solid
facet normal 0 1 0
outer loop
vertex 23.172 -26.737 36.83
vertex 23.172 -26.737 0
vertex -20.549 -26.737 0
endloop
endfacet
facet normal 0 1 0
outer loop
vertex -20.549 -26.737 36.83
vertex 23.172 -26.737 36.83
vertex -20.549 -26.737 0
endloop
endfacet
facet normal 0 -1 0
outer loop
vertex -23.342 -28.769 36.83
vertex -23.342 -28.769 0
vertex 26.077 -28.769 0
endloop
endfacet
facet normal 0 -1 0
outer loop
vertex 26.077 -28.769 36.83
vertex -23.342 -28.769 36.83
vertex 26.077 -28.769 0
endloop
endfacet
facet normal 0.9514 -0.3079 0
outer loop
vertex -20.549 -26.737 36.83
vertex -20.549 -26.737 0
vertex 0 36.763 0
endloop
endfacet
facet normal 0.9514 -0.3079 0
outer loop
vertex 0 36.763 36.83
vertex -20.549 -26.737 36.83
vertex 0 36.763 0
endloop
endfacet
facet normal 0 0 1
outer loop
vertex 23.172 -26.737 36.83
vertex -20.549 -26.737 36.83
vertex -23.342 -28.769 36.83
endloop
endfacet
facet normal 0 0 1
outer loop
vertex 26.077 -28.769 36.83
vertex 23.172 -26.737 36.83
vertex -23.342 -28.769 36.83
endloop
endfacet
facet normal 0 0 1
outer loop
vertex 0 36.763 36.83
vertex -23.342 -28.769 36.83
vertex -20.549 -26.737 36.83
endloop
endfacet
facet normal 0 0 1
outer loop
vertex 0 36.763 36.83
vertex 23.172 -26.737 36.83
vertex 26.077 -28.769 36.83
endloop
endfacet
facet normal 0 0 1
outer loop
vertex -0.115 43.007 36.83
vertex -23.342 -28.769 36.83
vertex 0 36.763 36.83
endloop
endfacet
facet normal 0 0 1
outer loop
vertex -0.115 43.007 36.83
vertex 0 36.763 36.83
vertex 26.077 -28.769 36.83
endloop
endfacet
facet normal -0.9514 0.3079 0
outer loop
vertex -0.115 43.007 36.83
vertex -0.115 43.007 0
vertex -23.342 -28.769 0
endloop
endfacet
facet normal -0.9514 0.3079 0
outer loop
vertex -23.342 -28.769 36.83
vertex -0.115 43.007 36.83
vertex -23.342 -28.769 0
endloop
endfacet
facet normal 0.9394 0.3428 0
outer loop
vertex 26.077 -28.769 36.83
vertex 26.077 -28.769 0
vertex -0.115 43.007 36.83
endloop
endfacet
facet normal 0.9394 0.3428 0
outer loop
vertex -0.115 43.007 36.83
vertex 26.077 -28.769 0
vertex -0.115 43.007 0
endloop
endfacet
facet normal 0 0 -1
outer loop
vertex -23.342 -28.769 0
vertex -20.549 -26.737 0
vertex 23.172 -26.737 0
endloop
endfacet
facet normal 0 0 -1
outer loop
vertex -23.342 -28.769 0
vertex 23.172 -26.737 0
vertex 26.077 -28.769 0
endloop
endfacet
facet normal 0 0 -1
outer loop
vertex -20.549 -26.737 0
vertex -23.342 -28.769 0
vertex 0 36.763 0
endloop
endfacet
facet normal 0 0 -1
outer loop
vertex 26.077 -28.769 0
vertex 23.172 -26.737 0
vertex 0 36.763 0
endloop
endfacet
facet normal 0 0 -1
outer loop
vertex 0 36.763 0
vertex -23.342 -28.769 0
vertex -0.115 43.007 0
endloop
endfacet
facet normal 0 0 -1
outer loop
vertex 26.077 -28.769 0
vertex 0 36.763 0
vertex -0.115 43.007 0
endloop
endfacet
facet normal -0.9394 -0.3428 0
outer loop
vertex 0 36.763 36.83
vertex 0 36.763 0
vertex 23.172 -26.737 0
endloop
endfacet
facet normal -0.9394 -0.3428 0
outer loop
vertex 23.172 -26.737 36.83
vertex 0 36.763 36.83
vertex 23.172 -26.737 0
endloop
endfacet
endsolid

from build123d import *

# Parameters (mm, degrees)
F1_DEPTH = 36.83


with BuildPart() as f1:
    # F0 (on Top) → F1 (new body)
    with BuildSketch(Plane.XY):
        Polygon((26.076875, -28.768841), (-0.115304, 43.006679), (-23.342333, -28.768841), align=None)
        Polygon((-20.549016, -26.736841), (0, 36.763159), (23.172293, -26.736841), (0, -26.736841), align=None, mode=Mode.SUBTRACT)
    extrude(amount=F1_DEPTH)


solid = f1.part
